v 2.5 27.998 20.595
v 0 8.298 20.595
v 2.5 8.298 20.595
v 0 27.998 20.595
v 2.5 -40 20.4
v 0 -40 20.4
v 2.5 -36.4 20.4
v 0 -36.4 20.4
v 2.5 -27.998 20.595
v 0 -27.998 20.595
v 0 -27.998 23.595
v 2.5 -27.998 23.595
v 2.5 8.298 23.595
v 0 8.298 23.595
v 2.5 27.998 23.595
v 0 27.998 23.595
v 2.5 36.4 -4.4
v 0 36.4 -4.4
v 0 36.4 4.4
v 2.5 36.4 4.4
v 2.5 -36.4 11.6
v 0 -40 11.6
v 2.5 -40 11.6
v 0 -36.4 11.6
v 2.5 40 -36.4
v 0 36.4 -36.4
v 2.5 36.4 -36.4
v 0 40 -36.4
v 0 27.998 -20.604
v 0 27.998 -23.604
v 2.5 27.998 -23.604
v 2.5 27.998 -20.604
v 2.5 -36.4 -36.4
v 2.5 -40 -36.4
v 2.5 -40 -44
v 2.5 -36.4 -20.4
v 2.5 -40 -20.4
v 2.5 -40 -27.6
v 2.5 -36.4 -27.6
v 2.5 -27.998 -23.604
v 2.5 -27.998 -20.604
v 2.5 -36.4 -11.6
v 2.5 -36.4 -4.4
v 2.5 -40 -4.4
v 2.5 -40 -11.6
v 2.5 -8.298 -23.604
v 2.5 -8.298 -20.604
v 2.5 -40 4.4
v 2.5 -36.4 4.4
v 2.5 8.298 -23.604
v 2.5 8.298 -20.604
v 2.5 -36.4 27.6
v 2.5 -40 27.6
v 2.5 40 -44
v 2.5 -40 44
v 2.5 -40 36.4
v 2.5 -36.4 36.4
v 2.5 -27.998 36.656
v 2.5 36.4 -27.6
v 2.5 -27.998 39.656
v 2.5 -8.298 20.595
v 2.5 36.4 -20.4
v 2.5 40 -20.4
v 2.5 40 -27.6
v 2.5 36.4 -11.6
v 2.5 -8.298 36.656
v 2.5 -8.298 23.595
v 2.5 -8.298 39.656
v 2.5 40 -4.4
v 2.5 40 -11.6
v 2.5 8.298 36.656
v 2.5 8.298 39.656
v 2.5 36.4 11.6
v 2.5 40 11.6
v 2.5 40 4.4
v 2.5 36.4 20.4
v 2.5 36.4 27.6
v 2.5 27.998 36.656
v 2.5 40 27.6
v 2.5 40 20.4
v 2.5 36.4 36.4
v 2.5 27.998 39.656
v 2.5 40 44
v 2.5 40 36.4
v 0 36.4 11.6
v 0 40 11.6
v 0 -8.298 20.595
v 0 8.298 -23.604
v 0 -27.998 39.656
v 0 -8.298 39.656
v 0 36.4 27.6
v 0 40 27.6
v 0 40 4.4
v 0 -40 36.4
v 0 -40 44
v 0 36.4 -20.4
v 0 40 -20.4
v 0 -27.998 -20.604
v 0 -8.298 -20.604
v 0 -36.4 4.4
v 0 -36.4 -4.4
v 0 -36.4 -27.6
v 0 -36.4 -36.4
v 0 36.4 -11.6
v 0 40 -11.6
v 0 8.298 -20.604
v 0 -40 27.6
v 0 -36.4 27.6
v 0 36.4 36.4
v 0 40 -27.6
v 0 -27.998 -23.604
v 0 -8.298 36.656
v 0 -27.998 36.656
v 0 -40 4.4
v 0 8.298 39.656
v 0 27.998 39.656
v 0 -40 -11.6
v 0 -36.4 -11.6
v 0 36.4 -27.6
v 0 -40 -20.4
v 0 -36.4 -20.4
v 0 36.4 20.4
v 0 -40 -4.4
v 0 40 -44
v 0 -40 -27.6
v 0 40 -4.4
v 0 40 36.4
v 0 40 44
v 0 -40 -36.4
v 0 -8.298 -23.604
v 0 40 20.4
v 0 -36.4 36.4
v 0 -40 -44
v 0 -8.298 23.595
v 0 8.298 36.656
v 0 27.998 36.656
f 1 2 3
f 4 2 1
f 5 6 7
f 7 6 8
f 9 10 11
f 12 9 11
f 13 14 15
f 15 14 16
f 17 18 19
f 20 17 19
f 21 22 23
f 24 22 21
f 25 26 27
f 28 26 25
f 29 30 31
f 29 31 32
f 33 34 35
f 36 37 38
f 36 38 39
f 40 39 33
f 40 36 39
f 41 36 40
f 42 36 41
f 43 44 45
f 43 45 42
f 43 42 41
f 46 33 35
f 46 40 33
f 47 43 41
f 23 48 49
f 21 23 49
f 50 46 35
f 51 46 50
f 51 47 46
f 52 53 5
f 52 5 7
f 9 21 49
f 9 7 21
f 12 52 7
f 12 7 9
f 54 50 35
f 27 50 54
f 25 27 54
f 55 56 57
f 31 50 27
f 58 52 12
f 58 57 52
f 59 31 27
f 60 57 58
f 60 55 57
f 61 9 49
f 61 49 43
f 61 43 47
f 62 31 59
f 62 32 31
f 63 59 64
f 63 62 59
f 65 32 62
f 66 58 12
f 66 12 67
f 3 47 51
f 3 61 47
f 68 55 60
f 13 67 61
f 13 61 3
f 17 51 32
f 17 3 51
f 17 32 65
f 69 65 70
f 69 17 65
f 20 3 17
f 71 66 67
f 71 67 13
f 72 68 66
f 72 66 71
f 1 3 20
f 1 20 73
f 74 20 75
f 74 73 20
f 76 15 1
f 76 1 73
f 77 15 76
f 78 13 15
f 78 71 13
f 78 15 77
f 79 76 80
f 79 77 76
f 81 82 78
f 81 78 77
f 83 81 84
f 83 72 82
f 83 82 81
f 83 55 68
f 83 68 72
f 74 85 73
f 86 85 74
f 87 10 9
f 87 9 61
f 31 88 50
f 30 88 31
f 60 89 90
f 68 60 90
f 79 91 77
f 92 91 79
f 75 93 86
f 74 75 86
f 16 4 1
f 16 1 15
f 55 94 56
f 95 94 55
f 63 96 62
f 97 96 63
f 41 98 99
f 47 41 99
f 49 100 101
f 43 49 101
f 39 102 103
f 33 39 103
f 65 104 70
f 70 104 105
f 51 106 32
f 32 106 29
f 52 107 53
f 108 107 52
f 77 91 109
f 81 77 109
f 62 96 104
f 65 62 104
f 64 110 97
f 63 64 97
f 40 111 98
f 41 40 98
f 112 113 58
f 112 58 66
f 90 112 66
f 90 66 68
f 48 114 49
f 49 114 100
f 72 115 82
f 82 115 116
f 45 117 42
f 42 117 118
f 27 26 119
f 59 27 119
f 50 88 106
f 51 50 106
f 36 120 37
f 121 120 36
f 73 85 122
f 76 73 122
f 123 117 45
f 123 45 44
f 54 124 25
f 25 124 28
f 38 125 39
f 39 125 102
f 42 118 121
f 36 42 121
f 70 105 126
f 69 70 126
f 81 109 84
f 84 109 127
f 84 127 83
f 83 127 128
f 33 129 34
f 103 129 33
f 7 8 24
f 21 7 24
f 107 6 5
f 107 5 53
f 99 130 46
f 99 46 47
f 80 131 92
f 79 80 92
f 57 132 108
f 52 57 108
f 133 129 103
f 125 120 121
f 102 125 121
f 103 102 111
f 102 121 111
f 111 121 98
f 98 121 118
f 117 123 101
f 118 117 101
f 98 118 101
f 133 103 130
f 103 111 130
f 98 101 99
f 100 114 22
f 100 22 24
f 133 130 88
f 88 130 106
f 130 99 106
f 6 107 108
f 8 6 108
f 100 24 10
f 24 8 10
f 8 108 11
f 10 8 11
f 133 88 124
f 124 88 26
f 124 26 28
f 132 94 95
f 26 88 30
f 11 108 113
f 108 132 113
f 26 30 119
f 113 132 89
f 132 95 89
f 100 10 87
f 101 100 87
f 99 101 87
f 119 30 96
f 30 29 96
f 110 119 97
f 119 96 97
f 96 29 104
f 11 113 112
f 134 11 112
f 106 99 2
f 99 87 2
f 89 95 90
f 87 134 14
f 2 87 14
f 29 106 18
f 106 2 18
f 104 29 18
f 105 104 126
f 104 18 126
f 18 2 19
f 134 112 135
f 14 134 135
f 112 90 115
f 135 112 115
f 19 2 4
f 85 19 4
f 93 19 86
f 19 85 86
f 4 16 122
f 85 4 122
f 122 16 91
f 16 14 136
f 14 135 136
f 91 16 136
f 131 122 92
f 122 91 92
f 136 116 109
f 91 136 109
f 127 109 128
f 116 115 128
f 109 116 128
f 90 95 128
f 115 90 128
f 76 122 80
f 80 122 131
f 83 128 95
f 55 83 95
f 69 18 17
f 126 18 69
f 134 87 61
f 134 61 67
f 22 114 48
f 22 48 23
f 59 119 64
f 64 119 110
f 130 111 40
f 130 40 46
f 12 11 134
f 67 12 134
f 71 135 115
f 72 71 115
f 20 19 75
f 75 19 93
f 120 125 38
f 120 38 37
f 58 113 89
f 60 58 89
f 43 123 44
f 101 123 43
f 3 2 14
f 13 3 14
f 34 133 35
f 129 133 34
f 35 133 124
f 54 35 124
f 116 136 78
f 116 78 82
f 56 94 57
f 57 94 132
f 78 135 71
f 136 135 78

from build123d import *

# Parameters (mm, degrees)
F0_W     = 3.6
F0_H     = 7.6
F0_H_2   = 7.2
F0_W_2   = 19.7
F0_H_3   = 3
F1_DEPTH = 2.5


# Not quite as in the source:
# - a feature names something its author has since deleted; it is built from what else it names


with BuildPart() as f1:
    # F0 (on Right) → F1 (new body)
    with BuildSketch(Plane.YZ):
        with Locations((38.2, -40.2)):
            Rectangle(F0_W, F0_H)
        with Locations((-38.2, -40.2)):
            Rectangle(F0_W, F0_H)
        with Locations((38.2, 40.2)):
            Rectangle(F0_W, F0_H)
        with Locations((-38.2, 40.2)):
            Rectangle(F0_W, F0_H)
        with Locations((38.2, -8)):
            Rectangle(F0_W, F0_H_2)
        with Locations((-38.2, -8)):
            Rectangle(F0_W, F0_H_2)
        Polygon((-36.4, -36.4), (-36.4, -44), (36.4, -44), (36.4, -36.4), (36.4, -27.6), (36.4, -20.4), (36.4, -11.6), (36.4, -4.4), (36.4, 4.4), (36.4, 11.6), (36.4, 20.4), (36.4, 27.6), (36.4, 36.4), (36.4, 44), (-36.4, 44), (-36.4, 36.4), (-36.4, 27.6), (-36.4, 20.4), (-36.4, 11.6), (-36.4, 4.4), (-36.4, -4.4), (-36.4, -11.6), (-36.4, -20.4), (-36.4, -27.6), align=None)
        with Locations((-18.148, -22.104)):
            Rectangle(F0_W_2, F0_H_3, mode=Mode.SUBTRACT)
        with Locations((18.148, -22.104)):
            Rectangle(F0_W_2, F0_H_3, mode=Mode.SUBTRACT)
        with Locations((-18.148, 22.095)):
            Rectangle(F0_W_2, F0_H_3, mode=Mode.SUBTRACT)
        with Locations((-18.148, 38.1555415094)):
            Rectangle(F0_W_2, F0_H_3, mode=Mode.SUBTRACT)
        with Locations((18.148, 22.095)):
            Rectangle(F0_W_2, F0_H_3, mode=Mode.SUBTRACT)
        with Locations((18.148, 38.1555415094)):
            Rectangle(F0_W_2, F0_H_3, mode=Mode.SUBTRACT)
        with Locations((38.2, -24)):
            Rectangle(F0_W, F0_H_2)
        with Locations((-38.2, -24)):
            Rectangle(F0_W, F0_H_2)
        with Locations((38.2, 8)):
            Rectangle(F0_W, F0_H_2)
        with Locations((-38.2, 24)):
            Rectangle(F0_W, F0_H_2)
        with Locations((38.2, 24)):
            Rectangle(F0_W, F0_H_2)
        with Locations((-38.2, 8)):
            Rectangle(F0_W, F0_H_2)
    extrude(amount=F1_DEPTH)


solid = f1.part
